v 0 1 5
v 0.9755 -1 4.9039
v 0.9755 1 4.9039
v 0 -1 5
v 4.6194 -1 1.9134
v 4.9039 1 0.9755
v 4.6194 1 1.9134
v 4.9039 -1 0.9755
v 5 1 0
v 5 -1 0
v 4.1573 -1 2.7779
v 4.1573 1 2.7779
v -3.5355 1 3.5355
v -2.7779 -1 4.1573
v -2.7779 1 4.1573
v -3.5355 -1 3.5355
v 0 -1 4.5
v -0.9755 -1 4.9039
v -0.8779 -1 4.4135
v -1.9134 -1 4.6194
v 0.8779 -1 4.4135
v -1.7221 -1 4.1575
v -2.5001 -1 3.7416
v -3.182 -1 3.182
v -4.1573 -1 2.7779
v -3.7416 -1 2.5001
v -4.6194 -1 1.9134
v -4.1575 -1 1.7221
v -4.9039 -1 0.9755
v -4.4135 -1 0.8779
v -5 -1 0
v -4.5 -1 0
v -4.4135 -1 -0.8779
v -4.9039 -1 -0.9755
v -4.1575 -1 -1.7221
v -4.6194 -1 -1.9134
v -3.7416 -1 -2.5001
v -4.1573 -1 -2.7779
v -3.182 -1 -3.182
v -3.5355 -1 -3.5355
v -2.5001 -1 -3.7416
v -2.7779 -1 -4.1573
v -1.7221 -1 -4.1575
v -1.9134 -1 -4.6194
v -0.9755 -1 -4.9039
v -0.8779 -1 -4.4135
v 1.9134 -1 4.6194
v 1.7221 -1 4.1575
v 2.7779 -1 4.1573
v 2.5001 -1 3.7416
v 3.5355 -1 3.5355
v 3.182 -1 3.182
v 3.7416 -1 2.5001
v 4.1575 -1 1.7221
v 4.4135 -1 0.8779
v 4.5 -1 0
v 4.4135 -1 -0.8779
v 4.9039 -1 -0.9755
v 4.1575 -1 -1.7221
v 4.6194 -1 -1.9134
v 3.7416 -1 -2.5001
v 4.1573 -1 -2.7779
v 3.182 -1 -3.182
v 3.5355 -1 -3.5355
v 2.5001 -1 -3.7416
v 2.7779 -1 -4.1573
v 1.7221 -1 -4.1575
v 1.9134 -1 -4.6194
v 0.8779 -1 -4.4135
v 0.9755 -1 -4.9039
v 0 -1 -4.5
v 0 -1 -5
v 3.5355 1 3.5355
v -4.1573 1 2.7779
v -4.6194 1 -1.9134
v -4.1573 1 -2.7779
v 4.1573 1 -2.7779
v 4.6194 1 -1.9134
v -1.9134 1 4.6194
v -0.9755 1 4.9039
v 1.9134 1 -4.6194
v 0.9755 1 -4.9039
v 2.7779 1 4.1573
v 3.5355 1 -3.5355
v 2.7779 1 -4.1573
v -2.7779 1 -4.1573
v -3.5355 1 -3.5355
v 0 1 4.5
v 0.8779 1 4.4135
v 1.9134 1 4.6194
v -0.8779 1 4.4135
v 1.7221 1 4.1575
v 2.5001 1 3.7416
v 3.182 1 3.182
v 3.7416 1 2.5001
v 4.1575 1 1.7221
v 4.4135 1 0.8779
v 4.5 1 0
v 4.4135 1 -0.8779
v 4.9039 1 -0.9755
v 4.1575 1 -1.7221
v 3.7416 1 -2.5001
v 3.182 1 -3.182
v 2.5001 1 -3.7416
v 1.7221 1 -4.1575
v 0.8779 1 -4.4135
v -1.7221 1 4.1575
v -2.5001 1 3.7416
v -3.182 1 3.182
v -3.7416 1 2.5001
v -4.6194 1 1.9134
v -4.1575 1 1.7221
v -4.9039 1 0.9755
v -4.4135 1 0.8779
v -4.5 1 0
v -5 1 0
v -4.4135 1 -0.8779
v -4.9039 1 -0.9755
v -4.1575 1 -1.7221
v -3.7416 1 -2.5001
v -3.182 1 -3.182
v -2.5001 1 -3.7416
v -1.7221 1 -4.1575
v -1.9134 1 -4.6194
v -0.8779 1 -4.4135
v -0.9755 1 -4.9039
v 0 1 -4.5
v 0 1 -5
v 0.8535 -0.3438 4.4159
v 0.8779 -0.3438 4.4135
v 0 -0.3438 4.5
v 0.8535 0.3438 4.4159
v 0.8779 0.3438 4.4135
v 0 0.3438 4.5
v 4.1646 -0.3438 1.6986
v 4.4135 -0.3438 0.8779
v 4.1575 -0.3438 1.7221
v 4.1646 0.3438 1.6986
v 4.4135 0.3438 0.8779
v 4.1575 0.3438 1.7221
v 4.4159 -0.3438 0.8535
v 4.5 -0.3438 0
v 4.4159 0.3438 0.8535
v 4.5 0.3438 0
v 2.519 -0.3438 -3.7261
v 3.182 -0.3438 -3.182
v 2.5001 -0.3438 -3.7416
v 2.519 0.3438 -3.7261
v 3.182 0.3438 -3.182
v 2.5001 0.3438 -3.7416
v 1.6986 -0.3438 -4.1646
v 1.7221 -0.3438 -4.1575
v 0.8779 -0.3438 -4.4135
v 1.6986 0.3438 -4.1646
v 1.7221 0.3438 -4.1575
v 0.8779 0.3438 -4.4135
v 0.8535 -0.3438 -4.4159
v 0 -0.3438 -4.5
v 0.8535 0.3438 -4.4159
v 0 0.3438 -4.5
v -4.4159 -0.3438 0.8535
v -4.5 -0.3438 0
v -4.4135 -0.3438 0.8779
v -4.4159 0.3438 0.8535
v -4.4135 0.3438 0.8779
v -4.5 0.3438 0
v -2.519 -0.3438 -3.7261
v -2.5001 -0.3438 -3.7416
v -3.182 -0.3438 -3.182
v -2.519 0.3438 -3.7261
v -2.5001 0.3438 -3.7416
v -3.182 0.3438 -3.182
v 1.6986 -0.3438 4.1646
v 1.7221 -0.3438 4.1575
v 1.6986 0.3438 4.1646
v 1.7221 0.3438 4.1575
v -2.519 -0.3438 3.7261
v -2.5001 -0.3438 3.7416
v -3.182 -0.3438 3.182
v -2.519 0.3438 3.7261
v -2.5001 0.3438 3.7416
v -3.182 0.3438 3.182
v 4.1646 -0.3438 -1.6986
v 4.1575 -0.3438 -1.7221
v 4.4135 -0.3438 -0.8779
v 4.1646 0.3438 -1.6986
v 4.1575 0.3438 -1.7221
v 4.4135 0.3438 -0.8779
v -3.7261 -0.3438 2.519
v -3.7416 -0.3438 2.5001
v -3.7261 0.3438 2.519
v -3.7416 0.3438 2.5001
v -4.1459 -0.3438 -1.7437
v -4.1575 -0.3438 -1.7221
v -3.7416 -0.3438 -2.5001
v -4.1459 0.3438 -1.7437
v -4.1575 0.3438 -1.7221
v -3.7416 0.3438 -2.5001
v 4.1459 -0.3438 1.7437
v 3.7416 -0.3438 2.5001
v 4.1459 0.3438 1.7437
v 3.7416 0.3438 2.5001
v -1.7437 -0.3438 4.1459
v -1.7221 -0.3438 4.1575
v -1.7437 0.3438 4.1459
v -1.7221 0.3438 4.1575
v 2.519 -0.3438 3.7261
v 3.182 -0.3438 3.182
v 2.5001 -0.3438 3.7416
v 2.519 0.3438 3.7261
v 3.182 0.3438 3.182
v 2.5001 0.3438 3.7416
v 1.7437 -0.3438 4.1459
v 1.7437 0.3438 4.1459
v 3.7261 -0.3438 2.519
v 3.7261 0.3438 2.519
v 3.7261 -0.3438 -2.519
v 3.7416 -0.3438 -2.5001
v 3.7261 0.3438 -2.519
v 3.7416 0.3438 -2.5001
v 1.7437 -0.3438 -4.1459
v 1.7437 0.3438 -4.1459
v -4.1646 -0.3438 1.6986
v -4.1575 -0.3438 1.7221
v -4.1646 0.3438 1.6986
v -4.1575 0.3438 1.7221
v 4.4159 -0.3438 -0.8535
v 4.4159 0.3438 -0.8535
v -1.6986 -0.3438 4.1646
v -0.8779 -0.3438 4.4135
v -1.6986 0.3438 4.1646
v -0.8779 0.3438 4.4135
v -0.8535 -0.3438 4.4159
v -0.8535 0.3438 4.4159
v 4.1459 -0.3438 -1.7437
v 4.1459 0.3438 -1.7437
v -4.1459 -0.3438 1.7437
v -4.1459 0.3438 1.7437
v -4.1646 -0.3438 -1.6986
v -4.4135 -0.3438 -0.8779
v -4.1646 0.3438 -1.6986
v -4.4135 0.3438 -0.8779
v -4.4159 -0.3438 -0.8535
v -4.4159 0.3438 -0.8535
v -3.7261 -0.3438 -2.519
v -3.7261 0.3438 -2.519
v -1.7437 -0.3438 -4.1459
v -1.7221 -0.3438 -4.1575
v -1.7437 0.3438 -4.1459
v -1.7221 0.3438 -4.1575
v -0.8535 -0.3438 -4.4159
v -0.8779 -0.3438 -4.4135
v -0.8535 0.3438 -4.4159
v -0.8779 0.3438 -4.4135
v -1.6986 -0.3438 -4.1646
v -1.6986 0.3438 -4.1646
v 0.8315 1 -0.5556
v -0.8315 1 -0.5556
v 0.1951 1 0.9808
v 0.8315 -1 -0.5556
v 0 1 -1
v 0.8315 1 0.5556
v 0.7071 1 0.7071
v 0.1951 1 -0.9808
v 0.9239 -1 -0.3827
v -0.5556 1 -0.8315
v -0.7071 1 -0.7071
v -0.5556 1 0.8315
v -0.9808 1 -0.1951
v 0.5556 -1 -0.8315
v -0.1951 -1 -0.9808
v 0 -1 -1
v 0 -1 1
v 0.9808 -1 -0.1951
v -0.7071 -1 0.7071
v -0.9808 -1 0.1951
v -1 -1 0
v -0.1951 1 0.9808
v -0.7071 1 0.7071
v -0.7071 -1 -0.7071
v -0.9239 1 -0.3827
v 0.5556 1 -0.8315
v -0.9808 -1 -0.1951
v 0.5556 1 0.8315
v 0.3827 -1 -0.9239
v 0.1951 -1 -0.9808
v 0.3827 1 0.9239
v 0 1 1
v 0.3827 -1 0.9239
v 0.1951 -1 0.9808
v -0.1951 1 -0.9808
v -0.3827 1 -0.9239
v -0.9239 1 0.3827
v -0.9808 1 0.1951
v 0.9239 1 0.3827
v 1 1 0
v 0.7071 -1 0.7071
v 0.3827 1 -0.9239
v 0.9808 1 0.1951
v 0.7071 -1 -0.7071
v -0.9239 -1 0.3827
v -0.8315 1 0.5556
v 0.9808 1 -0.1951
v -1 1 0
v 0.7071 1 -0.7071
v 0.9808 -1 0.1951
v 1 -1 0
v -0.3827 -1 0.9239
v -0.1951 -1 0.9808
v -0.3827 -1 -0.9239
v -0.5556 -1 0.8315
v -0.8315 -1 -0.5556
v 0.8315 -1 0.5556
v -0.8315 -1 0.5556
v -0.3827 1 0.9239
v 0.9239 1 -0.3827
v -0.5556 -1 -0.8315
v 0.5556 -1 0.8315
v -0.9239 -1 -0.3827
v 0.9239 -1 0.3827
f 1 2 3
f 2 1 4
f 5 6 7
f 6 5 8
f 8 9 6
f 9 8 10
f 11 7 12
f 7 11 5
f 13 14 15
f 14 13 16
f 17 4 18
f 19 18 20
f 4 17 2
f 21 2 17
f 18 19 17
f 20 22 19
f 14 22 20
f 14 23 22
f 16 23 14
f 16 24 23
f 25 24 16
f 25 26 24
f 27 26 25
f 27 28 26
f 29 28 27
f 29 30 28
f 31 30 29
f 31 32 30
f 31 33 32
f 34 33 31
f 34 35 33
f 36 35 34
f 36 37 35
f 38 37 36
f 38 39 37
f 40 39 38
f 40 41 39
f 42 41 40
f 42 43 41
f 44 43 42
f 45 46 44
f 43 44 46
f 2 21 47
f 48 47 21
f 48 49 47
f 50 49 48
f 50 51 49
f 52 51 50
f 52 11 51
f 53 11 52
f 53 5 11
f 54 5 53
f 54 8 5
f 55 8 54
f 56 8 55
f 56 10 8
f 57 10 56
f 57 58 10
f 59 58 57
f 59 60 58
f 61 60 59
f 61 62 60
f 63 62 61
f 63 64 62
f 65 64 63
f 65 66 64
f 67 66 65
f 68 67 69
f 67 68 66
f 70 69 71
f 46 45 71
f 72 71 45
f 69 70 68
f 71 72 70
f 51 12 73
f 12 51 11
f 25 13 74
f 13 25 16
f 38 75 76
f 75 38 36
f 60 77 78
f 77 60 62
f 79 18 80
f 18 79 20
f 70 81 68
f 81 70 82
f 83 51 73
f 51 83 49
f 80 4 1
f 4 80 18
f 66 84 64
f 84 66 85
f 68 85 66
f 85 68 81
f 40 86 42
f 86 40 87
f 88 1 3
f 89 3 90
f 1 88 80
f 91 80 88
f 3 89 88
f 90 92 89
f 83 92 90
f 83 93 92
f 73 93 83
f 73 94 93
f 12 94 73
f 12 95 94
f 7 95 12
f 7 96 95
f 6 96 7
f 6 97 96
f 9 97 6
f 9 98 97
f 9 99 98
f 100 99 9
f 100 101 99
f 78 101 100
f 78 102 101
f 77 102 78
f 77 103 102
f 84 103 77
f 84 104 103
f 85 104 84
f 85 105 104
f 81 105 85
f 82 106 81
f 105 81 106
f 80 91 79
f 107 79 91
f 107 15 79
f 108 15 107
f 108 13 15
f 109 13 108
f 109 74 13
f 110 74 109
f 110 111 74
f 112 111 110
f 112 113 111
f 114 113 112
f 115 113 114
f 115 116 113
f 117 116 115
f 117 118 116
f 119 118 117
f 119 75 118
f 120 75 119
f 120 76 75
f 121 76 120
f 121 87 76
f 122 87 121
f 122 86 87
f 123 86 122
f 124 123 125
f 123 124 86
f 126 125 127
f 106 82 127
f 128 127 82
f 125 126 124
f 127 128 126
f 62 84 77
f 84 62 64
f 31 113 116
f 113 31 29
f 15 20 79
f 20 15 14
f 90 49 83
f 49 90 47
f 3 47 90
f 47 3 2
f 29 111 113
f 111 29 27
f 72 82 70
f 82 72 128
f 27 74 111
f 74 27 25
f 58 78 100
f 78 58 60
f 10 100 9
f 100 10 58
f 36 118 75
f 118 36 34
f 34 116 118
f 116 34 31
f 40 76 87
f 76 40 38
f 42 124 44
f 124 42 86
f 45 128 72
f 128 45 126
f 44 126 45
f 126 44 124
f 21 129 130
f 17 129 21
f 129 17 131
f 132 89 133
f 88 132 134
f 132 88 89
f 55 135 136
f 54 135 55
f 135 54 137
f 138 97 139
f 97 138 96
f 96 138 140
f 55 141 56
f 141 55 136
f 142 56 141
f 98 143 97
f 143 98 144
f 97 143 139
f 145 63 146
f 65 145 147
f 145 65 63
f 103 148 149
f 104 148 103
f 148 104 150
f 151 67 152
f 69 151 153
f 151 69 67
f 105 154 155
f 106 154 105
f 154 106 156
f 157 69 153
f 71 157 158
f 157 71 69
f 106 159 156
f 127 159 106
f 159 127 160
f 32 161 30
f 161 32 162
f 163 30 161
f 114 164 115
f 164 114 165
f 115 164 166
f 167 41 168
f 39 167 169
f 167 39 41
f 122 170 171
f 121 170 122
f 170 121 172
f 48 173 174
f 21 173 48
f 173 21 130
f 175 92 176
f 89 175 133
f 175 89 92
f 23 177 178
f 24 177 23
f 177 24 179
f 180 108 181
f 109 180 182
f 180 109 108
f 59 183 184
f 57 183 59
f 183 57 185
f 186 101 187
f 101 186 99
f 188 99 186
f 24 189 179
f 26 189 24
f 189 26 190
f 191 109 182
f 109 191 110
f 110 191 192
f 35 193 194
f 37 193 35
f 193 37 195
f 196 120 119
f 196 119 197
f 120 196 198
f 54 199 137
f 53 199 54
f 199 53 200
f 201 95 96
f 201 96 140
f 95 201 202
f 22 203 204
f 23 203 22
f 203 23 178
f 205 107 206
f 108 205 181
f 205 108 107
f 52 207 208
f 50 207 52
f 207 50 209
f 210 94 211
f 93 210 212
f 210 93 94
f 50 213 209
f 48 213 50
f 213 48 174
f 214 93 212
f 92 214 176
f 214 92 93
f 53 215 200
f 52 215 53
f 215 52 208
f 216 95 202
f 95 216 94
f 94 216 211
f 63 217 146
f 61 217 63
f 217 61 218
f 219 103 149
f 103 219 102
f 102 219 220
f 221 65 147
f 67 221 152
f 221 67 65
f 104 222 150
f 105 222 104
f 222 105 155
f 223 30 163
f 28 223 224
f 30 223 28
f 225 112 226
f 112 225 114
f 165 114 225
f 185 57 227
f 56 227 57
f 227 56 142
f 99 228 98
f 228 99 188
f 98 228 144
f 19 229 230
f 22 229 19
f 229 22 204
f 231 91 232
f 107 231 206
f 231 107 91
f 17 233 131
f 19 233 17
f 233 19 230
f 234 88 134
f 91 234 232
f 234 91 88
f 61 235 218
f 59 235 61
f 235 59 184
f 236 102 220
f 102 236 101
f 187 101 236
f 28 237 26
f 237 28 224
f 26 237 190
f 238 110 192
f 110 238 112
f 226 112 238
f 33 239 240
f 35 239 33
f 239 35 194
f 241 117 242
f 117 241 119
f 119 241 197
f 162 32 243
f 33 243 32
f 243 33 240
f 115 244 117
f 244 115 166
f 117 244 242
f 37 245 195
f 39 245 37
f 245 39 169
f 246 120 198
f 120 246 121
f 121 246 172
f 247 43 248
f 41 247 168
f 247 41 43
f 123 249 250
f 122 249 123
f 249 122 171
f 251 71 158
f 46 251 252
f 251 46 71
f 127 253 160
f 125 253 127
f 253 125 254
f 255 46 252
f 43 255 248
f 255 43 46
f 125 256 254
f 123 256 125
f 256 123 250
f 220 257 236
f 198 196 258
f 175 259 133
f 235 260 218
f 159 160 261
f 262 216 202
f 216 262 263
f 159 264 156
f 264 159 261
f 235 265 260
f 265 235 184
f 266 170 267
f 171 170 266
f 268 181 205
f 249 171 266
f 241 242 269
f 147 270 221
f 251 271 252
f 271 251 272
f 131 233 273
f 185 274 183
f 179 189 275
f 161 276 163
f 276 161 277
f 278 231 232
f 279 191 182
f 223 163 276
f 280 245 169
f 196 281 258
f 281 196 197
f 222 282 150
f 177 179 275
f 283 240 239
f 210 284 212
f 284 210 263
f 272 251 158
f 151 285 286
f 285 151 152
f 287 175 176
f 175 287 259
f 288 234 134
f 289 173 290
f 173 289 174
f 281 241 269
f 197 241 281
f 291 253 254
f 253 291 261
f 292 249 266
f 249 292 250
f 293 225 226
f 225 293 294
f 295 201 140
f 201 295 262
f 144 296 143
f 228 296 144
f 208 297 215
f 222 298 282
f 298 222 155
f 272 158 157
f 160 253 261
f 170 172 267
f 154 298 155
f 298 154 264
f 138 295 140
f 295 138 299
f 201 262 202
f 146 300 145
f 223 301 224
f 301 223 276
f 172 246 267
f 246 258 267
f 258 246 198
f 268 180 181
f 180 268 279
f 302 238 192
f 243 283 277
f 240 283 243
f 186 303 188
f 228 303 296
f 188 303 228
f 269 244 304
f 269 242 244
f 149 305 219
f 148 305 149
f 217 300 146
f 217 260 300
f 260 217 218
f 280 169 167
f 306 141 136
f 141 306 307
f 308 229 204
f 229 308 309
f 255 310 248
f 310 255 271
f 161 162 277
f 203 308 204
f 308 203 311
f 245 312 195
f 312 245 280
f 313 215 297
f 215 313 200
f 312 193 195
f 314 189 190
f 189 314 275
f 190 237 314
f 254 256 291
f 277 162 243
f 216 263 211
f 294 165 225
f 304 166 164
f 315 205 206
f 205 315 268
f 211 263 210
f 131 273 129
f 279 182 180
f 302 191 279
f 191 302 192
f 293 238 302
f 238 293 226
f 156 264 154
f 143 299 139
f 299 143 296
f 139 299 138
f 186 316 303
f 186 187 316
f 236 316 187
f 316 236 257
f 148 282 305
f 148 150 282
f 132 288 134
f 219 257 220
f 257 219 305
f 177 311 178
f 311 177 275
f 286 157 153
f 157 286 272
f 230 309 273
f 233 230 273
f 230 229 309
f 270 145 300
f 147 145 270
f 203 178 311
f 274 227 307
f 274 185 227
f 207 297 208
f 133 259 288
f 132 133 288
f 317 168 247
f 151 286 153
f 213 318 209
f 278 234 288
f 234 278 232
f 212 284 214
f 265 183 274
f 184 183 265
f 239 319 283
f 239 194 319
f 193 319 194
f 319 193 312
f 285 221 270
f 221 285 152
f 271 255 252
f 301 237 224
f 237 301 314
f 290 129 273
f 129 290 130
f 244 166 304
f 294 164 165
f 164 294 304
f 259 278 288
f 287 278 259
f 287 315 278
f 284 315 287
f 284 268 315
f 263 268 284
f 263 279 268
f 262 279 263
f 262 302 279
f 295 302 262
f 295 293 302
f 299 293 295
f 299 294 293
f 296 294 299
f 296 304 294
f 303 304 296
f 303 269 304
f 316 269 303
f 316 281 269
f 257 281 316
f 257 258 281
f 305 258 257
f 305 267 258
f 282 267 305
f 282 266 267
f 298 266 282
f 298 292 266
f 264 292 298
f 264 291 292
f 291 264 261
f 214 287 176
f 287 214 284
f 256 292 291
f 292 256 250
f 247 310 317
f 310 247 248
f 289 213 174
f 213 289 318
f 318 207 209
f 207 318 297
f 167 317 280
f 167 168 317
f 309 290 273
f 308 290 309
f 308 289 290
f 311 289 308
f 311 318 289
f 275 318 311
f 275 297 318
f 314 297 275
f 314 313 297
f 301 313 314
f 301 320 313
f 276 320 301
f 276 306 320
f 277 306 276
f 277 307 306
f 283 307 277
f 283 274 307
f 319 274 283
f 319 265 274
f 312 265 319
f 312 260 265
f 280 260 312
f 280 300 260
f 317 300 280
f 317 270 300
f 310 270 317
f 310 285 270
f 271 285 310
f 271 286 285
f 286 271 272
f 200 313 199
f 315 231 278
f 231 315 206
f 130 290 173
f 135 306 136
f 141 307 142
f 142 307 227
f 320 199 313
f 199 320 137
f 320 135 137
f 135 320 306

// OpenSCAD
use <lib.scad>

module wheelHD() {
	rotate([90,0,0]) union() {
		minkowskiOutsideRound(0.05,$fn=8)
		difference() {
			cyl(5,5,2,$fn=64);
			cyl(4.5,4.5,3,$fn=64);
		}
		difference() {
			hull() {
				cyl(5,5,0.5,$fn=64);
				cyl(1,1,2,$fn=64);
			}
			for (i = [0:45:315])
				#rotate([0,0,i]) translate([0,2.7,0.7]) rotate([-10.5,0,0]) box([0.1,2,0.1]);
			for (i = [0:45:315])
				#rotate([0,0,i]) translate([0,2.7,-0.7]) rotate([10.5,0,0]) box([0.1,2,0.1]);
		}
	}
}

module wheelLD() {
	rotate([90,0,0]) union() {
		difference() {
			cyl(5,5,2,$fn=32);
			cyl(4.5,4.5,3,$fn=32);
		}
		difference() {
			hull() {
				cyl(5,5,0.5,$fn=32);
				cyl(1,1,2,$fn=32);
			}
		}
	}
}

module baseHD() {
	//minkowskiOutsideRound(0.02,$fn=8)
	difference() {
		hull() {
			box([11.975,3.975,1]);
			translate([0,0,0.5]) rotate([90,0,0]) cyl(1,1,4,$fn=32);
		}
		translate([0,0,0.25]) box([10,3,5]);
	}
}

module baseLD() {
	difference() {
		hull() {
			box([11.975,3.975,1]);
			translate([0,0,0.5]) rotate([90,0,0]) cyl(1,1,4,$fn=8);
		}
		translate([0,0,0.25]) box([10,3,5]);
	}
}

module axelHD() {
	//minkowskiOutsideRound(0.05,$fn=8)
	rotate([90,0,0]) cyl(0.5,0.5,4.1,$fn=32);
}

module axelLD($fn=8) {
	rotate([90,0,0]) cyl(0.5,0.5,4.1);
}

//translate([0,0,1]) wheelHD();
//translate([0,0,0.5]) baseHD();
//translate([0,0,1]) axelHD();

//wheelHD();
//spokeHD();
//baseHD();
//axelHD();

wheelLD();
//spokeLD();
//baseLD();
//axelLD();
